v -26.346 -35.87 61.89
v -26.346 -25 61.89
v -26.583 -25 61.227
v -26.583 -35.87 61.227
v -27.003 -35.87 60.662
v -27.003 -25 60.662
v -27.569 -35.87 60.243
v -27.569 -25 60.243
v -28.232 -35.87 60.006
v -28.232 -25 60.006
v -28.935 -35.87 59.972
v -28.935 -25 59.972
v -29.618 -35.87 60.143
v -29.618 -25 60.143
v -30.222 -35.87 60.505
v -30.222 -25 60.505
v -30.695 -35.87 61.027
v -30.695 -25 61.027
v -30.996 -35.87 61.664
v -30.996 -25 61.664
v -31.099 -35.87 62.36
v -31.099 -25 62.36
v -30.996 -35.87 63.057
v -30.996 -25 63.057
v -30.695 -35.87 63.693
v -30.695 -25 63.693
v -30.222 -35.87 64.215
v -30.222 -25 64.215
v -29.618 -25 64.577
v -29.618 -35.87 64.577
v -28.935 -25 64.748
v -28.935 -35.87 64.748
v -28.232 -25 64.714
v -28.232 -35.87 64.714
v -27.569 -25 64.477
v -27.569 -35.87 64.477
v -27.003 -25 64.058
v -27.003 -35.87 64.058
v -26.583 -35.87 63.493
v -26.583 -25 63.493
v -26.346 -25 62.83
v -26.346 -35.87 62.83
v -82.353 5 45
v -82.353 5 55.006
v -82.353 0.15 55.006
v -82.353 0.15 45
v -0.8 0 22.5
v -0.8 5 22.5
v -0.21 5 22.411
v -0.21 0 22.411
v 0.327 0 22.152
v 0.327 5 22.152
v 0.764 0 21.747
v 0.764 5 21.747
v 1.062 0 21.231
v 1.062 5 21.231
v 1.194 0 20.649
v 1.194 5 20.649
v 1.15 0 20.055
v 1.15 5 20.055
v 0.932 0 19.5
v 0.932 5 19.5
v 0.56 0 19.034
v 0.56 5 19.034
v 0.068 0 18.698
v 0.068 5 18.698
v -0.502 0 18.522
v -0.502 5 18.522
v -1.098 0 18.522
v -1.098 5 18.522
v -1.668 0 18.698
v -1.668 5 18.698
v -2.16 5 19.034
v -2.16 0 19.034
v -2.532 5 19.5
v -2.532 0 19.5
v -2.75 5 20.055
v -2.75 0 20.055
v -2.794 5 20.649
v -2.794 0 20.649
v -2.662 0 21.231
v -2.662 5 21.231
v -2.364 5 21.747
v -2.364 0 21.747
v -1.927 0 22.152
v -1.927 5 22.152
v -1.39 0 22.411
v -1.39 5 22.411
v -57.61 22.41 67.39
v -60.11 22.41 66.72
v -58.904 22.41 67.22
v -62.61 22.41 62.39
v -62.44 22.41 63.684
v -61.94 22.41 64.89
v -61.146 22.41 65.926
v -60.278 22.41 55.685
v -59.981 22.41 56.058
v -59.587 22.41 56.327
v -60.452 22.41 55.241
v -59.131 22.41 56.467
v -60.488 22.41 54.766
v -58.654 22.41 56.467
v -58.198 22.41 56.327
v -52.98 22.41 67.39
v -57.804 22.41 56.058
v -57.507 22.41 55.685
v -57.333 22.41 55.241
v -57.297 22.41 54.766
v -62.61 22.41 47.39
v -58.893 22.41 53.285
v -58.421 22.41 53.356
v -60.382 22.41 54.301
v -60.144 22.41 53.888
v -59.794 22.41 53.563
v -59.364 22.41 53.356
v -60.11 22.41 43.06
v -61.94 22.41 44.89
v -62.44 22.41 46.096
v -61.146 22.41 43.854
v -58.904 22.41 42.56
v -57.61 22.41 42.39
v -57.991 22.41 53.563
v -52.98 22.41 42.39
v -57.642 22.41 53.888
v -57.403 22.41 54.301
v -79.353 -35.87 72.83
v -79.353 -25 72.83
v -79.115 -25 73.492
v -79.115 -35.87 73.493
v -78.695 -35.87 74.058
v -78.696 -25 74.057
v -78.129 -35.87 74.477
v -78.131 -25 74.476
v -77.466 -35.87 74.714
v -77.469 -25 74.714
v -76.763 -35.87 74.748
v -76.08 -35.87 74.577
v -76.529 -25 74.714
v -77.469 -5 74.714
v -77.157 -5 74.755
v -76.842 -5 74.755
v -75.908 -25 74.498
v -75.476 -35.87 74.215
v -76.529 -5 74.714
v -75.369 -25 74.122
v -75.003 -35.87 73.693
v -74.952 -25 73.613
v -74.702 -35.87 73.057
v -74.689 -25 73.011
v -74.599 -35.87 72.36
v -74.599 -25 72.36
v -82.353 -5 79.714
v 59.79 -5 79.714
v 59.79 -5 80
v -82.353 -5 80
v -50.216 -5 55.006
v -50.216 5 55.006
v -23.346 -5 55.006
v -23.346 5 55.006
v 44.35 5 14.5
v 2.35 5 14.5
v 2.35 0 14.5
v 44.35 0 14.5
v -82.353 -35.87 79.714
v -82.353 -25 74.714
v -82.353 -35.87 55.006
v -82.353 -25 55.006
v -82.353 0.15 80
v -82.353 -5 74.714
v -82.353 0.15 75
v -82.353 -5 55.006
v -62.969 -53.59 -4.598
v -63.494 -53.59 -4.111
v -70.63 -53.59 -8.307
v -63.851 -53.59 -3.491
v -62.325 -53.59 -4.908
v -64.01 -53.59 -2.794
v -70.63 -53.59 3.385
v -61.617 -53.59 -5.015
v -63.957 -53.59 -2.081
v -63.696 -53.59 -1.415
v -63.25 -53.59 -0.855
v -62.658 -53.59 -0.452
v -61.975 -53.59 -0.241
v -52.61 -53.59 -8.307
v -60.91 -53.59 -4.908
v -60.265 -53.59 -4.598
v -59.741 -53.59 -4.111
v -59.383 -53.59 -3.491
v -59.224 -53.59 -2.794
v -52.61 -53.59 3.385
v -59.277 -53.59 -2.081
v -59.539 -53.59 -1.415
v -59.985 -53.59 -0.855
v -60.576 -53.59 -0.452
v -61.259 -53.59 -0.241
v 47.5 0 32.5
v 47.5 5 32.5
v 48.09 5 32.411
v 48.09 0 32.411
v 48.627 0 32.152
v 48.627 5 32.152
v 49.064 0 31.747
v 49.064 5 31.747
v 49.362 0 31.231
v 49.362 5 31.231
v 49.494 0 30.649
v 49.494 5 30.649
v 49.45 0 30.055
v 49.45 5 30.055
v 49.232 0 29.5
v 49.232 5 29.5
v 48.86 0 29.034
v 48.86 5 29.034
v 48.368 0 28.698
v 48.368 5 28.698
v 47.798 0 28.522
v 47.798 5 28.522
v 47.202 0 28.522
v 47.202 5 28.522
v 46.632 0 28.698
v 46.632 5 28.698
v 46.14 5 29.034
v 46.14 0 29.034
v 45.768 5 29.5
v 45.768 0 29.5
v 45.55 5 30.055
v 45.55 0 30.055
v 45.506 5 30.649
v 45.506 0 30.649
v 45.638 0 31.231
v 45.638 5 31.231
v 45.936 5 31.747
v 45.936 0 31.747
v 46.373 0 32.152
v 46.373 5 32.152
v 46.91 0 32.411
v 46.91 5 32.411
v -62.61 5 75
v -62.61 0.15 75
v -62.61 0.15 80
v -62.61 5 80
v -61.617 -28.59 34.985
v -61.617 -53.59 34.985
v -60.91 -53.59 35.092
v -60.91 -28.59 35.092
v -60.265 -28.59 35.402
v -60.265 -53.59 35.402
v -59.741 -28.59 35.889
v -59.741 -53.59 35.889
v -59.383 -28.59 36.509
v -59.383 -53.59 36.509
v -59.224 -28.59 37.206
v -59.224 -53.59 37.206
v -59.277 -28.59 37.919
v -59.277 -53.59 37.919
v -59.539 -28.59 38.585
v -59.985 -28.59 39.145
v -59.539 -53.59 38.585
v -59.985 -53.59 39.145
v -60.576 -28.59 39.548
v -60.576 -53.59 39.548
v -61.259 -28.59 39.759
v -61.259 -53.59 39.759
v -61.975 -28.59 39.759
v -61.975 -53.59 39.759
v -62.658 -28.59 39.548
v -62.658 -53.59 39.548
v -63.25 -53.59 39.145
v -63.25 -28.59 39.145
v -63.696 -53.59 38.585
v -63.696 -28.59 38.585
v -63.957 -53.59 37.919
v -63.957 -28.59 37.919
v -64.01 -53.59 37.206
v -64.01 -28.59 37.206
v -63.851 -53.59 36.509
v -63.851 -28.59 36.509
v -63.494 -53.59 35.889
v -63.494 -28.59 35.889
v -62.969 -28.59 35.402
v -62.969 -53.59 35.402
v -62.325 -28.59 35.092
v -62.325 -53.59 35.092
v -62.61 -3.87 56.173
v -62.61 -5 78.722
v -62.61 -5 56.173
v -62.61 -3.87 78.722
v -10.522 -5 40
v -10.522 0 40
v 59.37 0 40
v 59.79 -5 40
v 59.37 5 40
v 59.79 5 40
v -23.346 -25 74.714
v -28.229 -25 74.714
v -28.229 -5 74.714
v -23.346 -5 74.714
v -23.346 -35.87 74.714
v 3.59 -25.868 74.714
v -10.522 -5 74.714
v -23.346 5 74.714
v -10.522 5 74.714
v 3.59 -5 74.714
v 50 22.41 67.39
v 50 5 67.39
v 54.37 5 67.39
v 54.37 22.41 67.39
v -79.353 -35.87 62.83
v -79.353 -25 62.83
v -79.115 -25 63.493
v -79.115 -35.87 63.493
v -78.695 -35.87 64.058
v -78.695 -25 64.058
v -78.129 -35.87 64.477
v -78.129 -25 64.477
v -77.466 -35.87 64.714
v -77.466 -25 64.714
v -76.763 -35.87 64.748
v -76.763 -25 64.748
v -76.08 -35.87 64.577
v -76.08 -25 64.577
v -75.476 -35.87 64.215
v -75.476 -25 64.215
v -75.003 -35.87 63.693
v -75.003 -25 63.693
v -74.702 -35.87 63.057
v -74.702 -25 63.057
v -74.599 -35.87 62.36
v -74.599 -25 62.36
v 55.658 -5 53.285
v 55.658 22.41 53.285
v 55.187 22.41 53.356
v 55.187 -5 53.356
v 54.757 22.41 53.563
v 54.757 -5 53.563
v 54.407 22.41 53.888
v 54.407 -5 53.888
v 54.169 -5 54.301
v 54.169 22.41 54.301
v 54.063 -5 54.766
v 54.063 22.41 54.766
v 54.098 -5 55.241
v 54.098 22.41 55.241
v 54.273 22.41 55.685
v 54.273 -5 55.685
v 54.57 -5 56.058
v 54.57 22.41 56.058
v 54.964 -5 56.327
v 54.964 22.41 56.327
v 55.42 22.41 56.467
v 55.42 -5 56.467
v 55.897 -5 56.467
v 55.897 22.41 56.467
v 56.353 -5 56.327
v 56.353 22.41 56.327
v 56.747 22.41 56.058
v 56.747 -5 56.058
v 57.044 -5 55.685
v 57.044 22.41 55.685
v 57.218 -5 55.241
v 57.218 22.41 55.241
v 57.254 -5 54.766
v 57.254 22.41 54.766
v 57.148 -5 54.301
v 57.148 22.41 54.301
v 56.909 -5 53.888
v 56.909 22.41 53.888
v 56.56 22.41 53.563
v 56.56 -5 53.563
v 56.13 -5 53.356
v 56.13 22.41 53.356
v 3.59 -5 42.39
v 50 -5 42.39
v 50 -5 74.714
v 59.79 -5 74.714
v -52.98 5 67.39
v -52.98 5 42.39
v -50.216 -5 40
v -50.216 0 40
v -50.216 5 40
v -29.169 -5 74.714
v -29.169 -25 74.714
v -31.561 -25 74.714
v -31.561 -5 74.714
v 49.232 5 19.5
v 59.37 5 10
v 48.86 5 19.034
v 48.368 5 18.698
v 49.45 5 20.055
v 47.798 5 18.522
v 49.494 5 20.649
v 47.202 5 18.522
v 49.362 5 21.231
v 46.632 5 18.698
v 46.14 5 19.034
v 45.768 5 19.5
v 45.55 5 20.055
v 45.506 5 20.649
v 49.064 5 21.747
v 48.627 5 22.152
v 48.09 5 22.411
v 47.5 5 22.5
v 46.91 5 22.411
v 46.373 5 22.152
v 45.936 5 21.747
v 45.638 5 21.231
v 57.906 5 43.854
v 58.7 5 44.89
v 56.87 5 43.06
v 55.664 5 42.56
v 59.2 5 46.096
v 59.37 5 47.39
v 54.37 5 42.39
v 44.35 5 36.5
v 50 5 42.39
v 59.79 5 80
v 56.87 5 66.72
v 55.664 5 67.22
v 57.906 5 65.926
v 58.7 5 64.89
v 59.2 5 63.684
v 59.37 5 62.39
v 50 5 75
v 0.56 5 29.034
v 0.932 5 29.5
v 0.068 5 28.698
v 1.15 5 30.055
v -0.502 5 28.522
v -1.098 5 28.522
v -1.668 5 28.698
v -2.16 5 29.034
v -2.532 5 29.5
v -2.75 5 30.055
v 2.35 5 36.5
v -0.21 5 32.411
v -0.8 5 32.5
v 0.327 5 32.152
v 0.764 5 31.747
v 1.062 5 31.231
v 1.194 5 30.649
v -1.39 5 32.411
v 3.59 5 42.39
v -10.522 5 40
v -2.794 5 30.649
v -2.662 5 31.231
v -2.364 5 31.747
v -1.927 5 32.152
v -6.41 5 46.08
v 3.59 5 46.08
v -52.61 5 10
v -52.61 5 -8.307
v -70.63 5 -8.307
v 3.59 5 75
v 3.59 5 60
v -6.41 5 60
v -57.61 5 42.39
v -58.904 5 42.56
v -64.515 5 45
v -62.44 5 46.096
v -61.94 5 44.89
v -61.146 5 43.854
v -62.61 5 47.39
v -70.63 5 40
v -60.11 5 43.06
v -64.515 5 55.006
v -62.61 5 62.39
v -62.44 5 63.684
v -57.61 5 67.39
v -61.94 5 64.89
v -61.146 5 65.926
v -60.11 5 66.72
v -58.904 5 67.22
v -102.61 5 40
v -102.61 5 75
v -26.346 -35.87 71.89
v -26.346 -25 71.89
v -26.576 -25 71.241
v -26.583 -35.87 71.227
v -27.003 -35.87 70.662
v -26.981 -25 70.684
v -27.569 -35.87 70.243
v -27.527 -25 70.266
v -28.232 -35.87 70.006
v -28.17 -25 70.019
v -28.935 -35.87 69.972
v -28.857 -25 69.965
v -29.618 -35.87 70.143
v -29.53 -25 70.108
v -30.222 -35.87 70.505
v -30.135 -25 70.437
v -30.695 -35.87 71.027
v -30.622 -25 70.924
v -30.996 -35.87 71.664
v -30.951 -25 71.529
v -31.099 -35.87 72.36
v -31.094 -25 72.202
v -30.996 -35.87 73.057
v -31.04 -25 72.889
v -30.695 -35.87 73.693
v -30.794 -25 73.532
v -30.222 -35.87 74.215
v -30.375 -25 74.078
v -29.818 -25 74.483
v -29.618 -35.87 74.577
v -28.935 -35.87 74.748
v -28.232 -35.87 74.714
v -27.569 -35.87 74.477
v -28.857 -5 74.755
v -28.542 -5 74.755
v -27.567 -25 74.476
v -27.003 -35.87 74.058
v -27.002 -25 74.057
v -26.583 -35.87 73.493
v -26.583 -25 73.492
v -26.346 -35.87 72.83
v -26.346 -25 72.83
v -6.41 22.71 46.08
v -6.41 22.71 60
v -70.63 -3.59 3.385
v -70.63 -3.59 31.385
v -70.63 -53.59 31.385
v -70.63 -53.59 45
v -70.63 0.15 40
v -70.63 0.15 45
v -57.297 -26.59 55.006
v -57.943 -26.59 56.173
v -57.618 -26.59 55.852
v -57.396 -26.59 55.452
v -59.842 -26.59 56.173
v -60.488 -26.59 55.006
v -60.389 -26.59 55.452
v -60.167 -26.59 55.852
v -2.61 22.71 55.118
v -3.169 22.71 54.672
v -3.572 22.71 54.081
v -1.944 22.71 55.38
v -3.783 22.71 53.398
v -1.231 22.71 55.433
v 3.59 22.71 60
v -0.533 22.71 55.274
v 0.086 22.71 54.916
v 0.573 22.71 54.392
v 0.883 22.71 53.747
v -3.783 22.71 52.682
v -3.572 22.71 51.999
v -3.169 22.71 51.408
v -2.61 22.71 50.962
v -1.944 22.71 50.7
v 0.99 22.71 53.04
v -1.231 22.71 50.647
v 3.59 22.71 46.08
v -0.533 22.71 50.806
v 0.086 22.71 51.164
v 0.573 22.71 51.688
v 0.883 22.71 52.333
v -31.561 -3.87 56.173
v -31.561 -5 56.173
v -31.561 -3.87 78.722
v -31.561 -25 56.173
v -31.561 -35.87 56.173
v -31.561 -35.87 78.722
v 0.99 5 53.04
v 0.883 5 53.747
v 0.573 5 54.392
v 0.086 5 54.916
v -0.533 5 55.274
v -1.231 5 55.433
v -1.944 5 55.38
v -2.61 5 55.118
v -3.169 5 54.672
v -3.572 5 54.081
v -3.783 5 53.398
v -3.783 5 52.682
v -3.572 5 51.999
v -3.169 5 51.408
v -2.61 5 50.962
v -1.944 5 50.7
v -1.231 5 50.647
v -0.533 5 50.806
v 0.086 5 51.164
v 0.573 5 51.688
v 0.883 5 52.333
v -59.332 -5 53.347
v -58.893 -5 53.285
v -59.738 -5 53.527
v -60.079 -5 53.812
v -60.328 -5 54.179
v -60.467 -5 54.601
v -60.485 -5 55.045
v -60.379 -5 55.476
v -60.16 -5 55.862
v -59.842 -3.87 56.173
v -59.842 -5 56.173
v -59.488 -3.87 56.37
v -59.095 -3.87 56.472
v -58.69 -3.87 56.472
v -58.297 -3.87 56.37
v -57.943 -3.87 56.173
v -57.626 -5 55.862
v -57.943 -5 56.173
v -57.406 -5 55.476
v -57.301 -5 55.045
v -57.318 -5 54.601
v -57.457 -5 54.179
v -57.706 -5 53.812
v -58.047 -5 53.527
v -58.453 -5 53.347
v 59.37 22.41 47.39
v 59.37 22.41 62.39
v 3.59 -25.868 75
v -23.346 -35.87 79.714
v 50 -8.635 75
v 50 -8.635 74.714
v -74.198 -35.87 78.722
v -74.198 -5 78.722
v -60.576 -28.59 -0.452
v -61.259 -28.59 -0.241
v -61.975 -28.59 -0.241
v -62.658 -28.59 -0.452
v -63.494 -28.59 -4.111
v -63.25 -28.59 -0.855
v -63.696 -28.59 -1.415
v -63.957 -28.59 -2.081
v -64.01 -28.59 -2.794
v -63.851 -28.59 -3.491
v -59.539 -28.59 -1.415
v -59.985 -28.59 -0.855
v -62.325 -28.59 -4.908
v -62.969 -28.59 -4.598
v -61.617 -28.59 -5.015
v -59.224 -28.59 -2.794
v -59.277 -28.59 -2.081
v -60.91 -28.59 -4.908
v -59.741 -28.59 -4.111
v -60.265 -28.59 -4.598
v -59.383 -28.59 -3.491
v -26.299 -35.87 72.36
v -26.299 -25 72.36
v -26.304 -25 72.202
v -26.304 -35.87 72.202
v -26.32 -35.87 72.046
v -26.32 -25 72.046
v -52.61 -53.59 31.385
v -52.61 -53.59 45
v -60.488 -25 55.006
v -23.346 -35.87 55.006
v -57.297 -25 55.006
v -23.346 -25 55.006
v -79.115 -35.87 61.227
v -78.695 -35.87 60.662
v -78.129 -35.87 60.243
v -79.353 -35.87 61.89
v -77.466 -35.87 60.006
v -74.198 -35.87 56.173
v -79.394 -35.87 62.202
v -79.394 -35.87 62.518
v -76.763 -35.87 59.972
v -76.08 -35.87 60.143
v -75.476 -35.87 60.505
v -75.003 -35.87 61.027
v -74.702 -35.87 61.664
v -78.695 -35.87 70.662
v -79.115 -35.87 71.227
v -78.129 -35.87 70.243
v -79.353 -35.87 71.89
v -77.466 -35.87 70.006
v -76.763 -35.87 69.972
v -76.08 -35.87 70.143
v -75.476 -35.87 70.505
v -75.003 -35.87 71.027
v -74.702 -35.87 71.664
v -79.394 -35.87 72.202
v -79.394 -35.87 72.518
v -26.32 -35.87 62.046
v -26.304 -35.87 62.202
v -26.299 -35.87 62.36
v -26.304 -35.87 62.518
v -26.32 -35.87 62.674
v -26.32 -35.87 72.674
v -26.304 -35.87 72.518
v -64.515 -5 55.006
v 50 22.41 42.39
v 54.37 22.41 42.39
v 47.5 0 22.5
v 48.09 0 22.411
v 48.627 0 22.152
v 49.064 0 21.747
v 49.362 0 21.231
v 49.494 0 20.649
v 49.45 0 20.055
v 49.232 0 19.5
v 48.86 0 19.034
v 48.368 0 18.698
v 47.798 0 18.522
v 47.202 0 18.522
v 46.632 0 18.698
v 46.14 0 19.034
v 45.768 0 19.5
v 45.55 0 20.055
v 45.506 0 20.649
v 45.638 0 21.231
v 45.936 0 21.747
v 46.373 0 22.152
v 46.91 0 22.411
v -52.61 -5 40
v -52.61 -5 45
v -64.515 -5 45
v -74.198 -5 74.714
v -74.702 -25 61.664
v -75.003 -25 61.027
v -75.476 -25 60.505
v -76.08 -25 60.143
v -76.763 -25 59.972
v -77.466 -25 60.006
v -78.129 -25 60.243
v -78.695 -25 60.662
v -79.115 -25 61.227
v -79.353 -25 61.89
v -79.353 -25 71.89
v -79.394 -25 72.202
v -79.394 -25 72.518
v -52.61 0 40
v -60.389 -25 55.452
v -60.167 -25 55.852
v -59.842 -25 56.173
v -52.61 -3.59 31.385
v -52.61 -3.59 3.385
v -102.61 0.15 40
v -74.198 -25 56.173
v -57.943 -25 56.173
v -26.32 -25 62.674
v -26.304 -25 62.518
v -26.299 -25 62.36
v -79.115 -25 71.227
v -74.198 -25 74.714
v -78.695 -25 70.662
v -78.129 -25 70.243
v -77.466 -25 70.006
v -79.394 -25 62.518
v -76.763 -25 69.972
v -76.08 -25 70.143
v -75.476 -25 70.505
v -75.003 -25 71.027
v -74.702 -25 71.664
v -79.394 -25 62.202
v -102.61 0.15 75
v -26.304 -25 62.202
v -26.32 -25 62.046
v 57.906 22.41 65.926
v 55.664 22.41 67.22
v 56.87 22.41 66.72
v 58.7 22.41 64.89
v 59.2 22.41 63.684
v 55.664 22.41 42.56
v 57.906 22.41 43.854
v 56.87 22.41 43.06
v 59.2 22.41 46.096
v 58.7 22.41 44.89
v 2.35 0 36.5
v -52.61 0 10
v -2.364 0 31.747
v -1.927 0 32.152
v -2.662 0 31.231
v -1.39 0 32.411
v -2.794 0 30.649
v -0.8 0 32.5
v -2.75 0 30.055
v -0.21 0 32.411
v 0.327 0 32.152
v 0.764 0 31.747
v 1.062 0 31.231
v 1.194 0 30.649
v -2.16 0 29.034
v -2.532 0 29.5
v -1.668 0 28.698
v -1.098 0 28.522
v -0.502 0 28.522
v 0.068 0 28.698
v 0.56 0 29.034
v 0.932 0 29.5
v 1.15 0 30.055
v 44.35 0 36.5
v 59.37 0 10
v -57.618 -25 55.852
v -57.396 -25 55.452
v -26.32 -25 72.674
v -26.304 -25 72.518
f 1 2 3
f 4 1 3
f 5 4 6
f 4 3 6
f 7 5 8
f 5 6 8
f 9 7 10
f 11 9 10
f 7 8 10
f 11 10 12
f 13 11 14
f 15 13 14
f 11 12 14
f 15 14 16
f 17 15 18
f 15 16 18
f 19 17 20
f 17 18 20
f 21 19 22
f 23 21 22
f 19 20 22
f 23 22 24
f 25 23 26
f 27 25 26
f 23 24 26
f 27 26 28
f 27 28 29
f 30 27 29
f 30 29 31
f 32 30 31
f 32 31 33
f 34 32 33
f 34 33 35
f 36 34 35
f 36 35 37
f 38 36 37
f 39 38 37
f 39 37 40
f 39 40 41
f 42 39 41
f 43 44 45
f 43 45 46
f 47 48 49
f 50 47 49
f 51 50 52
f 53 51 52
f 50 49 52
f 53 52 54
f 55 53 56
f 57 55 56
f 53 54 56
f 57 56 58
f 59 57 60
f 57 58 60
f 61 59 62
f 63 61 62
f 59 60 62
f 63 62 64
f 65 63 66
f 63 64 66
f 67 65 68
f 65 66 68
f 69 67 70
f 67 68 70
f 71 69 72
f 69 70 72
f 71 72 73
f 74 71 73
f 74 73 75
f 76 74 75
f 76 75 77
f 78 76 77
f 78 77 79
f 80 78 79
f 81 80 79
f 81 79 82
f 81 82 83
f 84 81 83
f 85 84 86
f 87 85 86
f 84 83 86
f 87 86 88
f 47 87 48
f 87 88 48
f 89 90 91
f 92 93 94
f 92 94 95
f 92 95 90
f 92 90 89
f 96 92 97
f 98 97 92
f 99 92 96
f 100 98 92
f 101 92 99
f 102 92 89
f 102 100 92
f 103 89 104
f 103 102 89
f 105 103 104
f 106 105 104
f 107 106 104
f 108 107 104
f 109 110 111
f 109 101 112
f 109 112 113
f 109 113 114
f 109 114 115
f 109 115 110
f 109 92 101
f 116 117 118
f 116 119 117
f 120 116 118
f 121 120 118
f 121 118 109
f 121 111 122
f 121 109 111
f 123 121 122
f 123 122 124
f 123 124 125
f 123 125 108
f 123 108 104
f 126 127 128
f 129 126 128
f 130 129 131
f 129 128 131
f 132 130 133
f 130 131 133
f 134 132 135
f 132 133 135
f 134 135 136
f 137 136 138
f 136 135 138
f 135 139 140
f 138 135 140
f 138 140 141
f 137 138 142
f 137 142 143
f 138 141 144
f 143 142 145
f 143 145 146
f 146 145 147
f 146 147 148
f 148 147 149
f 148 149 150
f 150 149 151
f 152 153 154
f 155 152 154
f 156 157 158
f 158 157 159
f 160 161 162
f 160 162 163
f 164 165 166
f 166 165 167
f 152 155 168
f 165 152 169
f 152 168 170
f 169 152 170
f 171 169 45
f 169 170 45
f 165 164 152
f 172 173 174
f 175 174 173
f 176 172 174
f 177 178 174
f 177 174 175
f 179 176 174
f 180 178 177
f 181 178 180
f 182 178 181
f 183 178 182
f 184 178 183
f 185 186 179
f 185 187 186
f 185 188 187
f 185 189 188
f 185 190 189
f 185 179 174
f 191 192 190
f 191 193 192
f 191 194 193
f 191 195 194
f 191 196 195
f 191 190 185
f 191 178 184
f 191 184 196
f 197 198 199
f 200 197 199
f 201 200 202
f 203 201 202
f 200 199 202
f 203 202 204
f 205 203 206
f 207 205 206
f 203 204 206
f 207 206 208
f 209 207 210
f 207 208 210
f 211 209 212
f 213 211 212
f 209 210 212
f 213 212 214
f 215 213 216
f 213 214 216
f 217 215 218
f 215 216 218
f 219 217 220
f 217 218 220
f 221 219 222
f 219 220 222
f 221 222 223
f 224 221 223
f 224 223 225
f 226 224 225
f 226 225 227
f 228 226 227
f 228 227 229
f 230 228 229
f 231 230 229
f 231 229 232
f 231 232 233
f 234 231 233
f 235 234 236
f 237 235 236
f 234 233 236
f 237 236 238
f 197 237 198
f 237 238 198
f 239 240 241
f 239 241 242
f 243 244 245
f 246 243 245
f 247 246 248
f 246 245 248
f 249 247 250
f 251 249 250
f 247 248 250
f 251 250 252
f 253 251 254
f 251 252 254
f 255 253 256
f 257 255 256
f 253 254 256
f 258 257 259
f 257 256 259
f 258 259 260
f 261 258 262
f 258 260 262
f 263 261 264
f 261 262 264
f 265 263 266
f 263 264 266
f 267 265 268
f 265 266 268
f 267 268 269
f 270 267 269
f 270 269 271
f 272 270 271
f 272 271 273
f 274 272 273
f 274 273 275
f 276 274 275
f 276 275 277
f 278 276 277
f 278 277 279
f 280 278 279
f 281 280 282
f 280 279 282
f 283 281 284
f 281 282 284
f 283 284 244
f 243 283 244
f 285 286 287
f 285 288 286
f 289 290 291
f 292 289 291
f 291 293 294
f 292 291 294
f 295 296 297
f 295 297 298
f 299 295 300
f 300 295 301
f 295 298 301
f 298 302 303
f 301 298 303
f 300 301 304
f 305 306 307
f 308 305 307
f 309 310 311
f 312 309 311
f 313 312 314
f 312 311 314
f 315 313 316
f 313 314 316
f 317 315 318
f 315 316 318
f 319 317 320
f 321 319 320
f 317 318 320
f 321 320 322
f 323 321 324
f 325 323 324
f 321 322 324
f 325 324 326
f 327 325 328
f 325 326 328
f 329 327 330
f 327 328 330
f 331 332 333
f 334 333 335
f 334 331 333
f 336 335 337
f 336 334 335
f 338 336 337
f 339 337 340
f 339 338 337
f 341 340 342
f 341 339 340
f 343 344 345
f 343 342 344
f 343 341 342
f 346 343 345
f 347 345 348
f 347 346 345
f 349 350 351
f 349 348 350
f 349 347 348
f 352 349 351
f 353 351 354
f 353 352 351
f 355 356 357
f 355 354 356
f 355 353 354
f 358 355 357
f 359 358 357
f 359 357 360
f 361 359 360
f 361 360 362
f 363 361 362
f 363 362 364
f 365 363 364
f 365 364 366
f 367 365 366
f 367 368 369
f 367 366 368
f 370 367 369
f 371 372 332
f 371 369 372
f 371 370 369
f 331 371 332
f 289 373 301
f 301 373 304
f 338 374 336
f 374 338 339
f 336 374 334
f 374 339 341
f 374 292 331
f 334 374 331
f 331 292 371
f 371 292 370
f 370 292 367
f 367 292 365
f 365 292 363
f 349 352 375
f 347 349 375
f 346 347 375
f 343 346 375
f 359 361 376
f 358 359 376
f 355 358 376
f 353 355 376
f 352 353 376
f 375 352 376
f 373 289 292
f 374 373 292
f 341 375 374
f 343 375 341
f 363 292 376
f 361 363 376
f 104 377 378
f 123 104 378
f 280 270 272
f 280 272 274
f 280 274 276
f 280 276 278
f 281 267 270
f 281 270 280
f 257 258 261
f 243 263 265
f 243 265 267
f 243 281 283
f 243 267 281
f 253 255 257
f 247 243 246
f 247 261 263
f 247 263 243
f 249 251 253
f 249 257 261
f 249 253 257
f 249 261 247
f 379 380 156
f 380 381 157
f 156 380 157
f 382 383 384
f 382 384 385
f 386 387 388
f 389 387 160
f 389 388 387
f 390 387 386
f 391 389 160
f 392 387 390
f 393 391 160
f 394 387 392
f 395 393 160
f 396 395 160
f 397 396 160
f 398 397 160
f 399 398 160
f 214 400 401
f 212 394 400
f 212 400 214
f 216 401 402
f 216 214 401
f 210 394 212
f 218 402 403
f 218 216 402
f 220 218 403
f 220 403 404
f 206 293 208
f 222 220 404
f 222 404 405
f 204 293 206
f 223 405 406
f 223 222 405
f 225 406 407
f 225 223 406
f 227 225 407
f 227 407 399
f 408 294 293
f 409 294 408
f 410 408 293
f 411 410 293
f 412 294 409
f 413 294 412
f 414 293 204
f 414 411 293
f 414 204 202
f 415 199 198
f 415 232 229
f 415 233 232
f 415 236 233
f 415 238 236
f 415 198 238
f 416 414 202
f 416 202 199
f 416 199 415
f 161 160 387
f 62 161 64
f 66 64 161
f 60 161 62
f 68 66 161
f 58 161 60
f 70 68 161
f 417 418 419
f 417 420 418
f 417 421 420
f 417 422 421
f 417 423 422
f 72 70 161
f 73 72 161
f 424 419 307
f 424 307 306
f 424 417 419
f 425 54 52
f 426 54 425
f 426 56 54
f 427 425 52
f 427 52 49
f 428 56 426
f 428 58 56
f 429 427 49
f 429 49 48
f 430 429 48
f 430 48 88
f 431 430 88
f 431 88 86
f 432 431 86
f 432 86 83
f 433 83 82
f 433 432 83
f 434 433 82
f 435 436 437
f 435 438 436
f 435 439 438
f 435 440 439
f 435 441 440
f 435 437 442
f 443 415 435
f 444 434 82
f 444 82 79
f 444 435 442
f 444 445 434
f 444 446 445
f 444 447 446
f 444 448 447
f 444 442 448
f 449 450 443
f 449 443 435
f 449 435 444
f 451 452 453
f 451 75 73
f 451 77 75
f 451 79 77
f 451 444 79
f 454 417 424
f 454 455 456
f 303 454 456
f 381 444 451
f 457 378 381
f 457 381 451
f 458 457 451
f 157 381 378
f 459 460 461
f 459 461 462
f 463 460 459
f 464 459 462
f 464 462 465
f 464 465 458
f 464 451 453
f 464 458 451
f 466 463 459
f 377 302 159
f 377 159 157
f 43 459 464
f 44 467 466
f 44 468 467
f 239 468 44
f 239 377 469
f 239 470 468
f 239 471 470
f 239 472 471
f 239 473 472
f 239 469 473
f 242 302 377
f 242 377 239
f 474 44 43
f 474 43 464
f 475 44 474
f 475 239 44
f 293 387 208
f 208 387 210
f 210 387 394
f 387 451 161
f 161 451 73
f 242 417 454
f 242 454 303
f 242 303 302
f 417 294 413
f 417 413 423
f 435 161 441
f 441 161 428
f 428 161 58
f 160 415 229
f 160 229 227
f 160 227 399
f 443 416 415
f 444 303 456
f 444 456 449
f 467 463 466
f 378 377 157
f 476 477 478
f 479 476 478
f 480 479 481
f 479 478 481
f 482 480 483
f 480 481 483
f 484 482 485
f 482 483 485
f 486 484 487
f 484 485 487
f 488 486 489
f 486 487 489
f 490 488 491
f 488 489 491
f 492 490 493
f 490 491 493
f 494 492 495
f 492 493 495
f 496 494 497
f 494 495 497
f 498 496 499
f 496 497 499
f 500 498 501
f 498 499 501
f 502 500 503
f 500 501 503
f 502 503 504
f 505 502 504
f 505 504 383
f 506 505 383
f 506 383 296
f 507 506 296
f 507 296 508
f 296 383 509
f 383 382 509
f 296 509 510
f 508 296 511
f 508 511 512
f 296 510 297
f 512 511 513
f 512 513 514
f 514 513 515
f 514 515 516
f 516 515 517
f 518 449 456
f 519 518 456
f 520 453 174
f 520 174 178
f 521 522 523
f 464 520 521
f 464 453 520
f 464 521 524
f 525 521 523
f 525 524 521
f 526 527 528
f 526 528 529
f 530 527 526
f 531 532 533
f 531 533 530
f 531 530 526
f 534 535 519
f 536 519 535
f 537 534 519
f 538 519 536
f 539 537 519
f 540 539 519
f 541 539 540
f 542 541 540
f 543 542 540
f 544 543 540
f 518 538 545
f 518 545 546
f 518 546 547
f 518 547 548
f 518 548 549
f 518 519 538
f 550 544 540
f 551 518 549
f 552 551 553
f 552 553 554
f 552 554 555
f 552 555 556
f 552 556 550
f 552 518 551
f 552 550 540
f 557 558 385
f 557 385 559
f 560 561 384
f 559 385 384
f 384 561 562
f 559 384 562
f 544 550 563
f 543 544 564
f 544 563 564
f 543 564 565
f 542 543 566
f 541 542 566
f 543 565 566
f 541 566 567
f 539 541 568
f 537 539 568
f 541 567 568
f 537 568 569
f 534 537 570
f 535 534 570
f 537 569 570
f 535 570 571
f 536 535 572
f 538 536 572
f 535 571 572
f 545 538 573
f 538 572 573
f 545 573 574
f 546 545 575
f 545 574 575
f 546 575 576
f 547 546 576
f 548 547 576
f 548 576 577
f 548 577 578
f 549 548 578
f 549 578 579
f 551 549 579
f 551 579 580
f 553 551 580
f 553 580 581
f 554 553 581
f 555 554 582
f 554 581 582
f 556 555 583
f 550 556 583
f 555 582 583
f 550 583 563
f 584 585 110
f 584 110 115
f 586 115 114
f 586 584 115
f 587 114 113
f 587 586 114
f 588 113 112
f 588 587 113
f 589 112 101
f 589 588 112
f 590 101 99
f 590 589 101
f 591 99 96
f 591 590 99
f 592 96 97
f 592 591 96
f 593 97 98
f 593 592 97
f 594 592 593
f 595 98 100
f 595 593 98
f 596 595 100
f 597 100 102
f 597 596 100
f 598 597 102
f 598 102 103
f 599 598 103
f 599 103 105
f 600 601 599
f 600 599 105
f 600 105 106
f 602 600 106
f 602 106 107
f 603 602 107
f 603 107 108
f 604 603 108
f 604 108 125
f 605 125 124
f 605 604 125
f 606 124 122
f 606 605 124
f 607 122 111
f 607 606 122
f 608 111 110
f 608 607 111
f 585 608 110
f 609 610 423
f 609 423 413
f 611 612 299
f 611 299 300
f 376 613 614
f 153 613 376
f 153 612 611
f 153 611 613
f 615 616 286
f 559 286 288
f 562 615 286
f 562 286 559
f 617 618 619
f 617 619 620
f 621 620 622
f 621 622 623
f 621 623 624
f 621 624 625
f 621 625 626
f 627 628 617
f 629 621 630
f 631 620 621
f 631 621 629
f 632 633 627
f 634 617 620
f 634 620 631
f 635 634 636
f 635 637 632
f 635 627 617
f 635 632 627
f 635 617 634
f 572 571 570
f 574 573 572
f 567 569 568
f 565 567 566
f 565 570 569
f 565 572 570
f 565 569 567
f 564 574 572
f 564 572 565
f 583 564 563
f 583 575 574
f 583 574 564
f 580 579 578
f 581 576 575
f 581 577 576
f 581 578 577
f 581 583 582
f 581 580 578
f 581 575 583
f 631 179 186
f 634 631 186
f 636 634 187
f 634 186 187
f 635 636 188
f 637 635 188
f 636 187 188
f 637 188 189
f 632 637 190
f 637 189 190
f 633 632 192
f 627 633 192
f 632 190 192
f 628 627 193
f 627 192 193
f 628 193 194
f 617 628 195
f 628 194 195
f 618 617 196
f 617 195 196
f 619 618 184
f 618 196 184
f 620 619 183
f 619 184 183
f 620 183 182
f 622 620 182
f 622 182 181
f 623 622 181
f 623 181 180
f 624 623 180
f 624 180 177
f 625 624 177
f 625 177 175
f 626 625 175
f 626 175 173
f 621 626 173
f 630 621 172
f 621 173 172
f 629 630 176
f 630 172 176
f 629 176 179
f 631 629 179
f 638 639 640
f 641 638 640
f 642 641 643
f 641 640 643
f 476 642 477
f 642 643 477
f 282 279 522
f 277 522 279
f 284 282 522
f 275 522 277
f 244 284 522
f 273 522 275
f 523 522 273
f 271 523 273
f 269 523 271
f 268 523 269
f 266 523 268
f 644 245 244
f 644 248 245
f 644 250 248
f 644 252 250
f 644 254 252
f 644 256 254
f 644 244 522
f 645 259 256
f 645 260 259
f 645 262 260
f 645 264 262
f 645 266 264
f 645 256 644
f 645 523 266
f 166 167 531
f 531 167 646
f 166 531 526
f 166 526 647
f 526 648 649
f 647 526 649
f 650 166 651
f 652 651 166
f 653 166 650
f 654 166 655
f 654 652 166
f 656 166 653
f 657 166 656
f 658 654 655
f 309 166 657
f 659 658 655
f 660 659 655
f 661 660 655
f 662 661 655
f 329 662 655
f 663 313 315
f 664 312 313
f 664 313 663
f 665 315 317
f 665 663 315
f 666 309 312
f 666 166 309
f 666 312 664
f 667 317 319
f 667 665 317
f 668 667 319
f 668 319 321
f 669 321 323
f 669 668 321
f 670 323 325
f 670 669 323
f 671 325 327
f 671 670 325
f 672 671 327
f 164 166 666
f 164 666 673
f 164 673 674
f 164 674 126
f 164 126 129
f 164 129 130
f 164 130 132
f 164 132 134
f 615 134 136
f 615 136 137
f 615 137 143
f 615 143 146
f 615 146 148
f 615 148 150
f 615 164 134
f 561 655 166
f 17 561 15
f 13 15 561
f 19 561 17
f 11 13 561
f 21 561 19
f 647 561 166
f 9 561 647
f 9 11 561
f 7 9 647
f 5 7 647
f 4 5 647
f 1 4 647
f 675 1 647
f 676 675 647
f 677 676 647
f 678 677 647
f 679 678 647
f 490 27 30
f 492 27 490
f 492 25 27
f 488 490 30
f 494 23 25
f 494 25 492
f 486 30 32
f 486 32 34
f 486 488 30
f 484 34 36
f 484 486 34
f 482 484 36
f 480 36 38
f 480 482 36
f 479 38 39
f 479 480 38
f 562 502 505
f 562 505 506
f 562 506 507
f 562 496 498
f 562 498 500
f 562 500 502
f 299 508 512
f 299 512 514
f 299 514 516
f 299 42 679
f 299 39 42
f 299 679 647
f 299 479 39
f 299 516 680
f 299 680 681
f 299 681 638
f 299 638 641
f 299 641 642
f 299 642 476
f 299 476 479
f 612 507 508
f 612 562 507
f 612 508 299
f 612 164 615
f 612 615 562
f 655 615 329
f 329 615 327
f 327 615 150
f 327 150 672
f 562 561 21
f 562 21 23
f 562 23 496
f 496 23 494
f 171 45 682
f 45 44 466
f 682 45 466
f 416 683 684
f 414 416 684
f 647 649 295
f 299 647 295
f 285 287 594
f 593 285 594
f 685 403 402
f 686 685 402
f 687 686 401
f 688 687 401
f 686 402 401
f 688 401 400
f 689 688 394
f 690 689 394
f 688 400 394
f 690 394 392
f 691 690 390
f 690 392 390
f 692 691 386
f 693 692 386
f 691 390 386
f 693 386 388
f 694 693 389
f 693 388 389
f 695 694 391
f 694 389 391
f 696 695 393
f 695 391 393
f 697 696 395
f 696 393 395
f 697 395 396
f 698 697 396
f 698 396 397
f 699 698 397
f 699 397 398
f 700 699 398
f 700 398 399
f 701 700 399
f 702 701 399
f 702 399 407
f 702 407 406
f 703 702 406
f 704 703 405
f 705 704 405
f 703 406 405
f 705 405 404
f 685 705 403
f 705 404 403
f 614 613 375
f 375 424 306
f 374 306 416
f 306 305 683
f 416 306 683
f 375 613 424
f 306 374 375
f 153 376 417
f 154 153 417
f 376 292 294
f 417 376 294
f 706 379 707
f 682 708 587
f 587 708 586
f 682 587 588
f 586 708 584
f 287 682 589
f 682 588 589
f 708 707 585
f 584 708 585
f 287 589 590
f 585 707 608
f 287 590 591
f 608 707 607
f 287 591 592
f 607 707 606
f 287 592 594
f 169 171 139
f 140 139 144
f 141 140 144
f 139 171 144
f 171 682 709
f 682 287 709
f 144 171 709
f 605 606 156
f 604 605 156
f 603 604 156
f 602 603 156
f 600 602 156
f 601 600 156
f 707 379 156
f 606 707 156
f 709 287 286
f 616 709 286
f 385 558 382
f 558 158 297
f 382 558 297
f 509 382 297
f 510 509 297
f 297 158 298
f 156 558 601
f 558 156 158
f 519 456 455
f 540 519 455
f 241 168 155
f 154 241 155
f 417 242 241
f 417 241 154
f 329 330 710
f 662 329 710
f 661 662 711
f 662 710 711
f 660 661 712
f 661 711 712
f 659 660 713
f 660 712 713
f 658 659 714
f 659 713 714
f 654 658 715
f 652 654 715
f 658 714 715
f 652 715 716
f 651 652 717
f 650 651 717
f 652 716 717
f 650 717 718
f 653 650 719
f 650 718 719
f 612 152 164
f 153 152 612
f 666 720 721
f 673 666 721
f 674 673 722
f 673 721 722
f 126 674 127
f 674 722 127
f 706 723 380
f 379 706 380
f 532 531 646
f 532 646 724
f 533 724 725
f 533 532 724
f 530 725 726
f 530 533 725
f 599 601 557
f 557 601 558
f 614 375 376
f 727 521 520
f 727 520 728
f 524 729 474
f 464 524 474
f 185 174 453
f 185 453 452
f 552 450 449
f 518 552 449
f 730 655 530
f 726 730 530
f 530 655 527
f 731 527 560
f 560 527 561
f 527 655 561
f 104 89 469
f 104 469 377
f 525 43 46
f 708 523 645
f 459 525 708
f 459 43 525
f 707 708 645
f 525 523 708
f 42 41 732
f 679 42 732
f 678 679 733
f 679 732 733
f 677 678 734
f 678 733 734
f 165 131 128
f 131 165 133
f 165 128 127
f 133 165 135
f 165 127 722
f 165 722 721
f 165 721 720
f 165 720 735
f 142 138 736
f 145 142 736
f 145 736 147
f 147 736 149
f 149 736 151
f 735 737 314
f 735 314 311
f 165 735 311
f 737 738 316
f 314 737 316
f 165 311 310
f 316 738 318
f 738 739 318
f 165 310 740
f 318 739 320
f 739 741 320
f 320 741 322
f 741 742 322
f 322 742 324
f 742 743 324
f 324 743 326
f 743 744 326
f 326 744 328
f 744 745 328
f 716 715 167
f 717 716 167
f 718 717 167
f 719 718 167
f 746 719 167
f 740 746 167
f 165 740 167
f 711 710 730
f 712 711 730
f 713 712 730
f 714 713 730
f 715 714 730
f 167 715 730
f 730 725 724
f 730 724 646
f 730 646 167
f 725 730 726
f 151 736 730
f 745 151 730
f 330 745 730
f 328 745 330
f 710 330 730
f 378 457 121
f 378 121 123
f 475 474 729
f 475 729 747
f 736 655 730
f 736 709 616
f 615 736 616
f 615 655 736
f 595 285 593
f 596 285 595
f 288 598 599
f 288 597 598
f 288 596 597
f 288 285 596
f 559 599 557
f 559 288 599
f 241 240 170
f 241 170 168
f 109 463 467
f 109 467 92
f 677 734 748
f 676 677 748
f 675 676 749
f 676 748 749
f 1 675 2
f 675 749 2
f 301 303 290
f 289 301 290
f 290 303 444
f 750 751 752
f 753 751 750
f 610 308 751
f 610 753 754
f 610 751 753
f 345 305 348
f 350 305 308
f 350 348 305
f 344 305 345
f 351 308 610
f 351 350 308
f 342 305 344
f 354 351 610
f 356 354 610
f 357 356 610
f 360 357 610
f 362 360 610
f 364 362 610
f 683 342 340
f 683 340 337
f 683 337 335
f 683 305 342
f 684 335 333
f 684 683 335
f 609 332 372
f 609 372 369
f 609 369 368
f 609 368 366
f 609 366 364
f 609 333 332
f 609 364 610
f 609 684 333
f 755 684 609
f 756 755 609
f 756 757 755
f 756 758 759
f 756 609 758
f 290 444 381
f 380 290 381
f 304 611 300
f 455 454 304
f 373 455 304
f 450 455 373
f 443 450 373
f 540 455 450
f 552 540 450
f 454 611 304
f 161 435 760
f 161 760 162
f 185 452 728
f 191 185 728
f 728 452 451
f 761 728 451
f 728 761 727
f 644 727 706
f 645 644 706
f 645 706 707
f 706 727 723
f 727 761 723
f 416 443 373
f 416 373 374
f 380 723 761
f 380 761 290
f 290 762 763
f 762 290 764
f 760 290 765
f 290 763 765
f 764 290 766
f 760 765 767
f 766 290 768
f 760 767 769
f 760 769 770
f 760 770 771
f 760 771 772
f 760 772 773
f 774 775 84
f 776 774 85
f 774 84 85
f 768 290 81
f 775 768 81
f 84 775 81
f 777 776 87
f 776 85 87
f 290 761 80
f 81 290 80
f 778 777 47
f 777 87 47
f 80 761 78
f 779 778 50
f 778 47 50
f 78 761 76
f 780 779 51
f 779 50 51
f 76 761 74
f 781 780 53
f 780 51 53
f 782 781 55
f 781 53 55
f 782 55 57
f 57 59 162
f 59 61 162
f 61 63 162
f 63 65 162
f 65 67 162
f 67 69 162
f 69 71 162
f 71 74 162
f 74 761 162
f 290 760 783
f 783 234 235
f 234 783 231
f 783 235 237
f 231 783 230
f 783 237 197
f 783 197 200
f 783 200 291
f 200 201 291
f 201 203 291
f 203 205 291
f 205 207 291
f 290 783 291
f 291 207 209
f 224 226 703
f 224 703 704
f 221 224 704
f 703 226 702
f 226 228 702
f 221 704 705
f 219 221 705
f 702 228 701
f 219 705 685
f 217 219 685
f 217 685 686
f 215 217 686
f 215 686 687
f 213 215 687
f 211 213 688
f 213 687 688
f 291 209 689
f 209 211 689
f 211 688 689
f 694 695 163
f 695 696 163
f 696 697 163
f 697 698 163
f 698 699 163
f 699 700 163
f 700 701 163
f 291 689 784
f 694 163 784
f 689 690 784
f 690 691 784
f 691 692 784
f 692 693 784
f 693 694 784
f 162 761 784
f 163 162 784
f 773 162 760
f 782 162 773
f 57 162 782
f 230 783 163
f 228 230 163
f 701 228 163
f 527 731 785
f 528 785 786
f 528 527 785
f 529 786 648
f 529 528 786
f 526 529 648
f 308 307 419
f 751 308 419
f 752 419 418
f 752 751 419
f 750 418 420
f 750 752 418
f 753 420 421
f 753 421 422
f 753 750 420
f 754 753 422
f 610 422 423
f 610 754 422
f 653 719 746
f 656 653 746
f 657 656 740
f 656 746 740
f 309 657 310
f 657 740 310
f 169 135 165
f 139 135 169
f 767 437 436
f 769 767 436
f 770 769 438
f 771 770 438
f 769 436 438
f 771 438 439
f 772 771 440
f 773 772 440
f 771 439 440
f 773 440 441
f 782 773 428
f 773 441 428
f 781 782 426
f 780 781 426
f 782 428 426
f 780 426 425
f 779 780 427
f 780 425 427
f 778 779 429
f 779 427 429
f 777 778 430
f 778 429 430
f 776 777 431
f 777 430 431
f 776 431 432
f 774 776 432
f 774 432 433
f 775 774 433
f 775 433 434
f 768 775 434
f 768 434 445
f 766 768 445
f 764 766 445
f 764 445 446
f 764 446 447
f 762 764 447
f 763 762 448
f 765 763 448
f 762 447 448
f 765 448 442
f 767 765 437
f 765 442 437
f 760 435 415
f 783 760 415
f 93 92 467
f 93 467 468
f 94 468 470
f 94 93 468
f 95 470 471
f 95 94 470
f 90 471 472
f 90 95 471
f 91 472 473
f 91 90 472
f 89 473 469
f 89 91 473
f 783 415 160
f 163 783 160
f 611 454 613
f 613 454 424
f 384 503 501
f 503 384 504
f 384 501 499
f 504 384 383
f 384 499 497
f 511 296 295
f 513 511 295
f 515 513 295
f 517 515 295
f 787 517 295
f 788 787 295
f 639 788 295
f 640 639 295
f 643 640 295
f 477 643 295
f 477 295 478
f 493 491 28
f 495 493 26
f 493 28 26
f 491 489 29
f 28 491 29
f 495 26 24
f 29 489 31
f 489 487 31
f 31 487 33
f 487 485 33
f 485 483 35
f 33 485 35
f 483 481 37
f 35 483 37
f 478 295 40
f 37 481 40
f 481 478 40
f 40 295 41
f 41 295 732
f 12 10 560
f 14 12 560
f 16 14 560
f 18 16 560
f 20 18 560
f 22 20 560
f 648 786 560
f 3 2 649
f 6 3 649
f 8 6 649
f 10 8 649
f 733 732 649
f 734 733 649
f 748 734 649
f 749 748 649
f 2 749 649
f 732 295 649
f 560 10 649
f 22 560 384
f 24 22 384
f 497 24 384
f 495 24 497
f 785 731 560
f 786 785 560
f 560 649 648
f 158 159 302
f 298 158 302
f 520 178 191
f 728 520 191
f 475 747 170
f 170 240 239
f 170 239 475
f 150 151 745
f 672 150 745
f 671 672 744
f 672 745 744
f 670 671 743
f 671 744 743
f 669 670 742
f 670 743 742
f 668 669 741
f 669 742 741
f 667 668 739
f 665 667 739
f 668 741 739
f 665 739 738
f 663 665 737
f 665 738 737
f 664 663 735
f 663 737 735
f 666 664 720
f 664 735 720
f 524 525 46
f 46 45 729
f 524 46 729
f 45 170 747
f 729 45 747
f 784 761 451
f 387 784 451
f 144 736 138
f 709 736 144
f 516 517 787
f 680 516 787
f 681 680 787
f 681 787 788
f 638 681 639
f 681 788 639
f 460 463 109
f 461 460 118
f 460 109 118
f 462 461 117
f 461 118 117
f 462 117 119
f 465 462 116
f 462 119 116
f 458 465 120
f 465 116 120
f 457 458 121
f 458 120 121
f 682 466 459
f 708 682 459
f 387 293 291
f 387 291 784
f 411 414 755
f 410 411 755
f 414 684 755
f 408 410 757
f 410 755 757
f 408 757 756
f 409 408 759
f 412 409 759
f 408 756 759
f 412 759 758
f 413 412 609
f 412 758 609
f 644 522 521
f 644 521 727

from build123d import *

# Parameters (mm, degrees)
SKETCH1_W            = 120
SKETCH1_H            = 80
BOSS_EXTRUDE1_DEPTH  = 5
SKETCH2_R            = 2.000000001
CUT_EXTRUDE2_DEPTH   = 5
SKETCH3_W            = 90
SKETCH3_H            = 50
CUT_EXTRUDE3_DEPTH   = 5
SKETCH4_W            = 10
SKETCH4_H            = 5
BOSS_EXTRUDE2_DEPTH  = 27.39
SKETCH5_W            = 10
SKETCH5_H            = 5
BOSS_EXTRUDE3_DEPTH  = 20
BOSS_EXTRUDE4_DEPTH  = 17.71
SKETCH7_W            = 10
SKETCH7_H            = 27.39
BOSS_EXTRUDE5_DEPTH  = 17.41
SKETCH8_W            = 10
SKETCH8_H            = 2.39
CUT_EXTRUDE4_DEPTH   = 17.41
SKETCH9_W            = 57.39
SKETCH9_H            = 22.41
CUT_EXTRUDE5_DEPTH   = 0.63
FILLET1_R            = 5
SKETCH10_R           = 1.600000001
CUT_EXTRUDE6_DEPTH   = 94.043840204
SKETCH11_W           = 30
SKETCH11_H           = 5
BOSS_EXTRUDE6_DEPTH  = 2.61
SKETCH12_W           = 9.63
SKETCH12_H           = 5
BOSS_EXTRUDE7_DEPTH  = 27.39
SKETCH13_W           = 9.63
SKETCH13_H           = 25
BOSS_EXTRUDE8_DEPTH  = 17.41
FILLET2_R            = 5
SKETCH14_R           = 1.6
CUT_EXTRUDE7_DEPTH   = 95.747919766
SKETCH15_W           = 122.4
SKETCH15_H           = 10
BOSS_EXTRUDE9_DEPTH  = 40
SKETCH16_W           = 30
SKETCH16_H           = 50
CUT_EXTRUDE8_DEPTH   = 104.119620829
SKETCH17_W           = 35.000212548
SKETCH17_H           = 4.85
BOSS_EXTRUDE10_DEPTH = 40
SKETCH18_W           = 20
SKETCH18_H           = 4.85
BOSS_EXTRUDE11_DEPTH = 60
SKETCH19_W           = 10
SKETCH19_H           = 4.85
BOSS_EXTRUDE12_DEPTH = 30
SKETCH20_W           = 18.02
SKETCH20_H           = 65
BOSS_EXTRUDE13_DEPTH = 53.74
SKETCH21_R           = 2.4
CUT_EXTRUDE9_DEPTH   = 25
BOSS_EXTRUDE14_DEPTH = 30.87
SKETCH28_W           = 42.63693761
SKETCH28_H           = 22.549263077
CUT_EXTRUDE11_DEPTH  = 32
SKETCH29_W           = 11.98
SKETCH29_H           = 4.85
CUT_EXTRUDE12_DEPTH  = 60
BOSS_EXTRUDE15_DEPTH = 19.742742811
BOSS_EXTRUDE16_DEPTH = 5
SKETCH32_W           = 42
SKETCH32_H           = 22
CUT_EXTRUDE13_DEPTH  = 25
SKETCH33_W           = 18.02
SKETCH33_H           = 28
CUT_EXTRUDE14_DEPTH  = 50
SKETCH34_W           = 18.02
SKETCH34_H           = 11.692668542
CUT_EXTRUDE15_DEPTH  = 60
SKETCH35_W           = 19.707106781
SKETCH35_H           = 20
CUT_EXTRUDE16_DEPTH  = 60
SKETCH36_W           = 46.41
SKETCH36_H           = 32.61
CUT_EXTRUDE18_DEPTH  = 60
SKETCH38_W           = 17.837944425
SKETCH38_H           = 10.006474067
CUT_EXTRUDE20_DEPTH  = 49
CUT_EXTRUDE21_START  = -49
SKETCH39_R           = 1.6
SKETCH39_R_2         = 1.600000001
CUT_EXTRUDE21_DEPTH  = 49


with BuildPart() as part:
    # Sketch1 → Boss-Extrude1 (new body)
    with BuildSketch(Plane(origin=(0, 0, 0), x_dir=(1, 0, 0), z_dir=(0, 1, 0))):
        Rectangle(SKETCH1_W, SKETCH1_H)
    extrude(amount=BOSS_EXTRUDE1_DEPTH)

    # Sketch2 → Cut-Extrude2 (cut)
    with BuildSketch(Plane(origin=(0, 5, 0), x_dir=(1, 0, 0), z_dir=(0, 1, 0))):
        with Locations(Location((47.5, -20.500000004, 0), (0, 0, 270))):
            Circle(SKETCH2_R)
        with Locations(Location((47.5, -30.500000004, 0), (0, 0, 270))):
            Circle(SKETCH2_R)
        with Locations(Location((-0.8, -30.500000004, 0), (0, 0, 270))):
            Circle(SKETCH2_R)
        with Locations(Location((-0.8, -20.500000004, 0), (0, 0, 270))):
            Circle(SKETCH2_R)
    extrude(amount=-CUT_EXTRUDE2_DEPTH, mode=Mode.SUBTRACT)

    # Sketch3 → Cut-Extrude3 (cut)
    with BuildSketch(Plane(origin=(0, 5, 0), x_dir=(1, 0, 0), z_dir=(0, 1, 0))):
        with Locations((15, 15)):
            Rectangle(SKETCH3_W, SKETCH3_H)
    extrude(amount=-CUT_EXTRUDE3_DEPTH, mode=Mode.SUBTRACT)

    # Sketch4 → Boss-Extrude2 (add)
    with BuildSketch(Plane.XY.offset(40)):
        with Locations((55, 2.5)):
            Rectangle(SKETCH4_W, SKETCH4_H)
    extrude(amount=BOSS_EXTRUDE2_DEPTH)

    # Sketch5 → Boss-Extrude3 (add)
    with BuildSketch(Plane.XY.offset(40)):
        with Locations((-1.41, 2.5)):
            Rectangle(SKETCH5_W, SKETCH5_H)
    extrude(amount=BOSS_EXTRUDE3_DEPTH)

    # Sketch6 → Boss-Extrude4 (add)
    with BuildSketch(Plane(origin=(0, 5, 0), x_dir=(1, 0, 0), z_dir=(0, 1, 0))):
        with BuildLine():
            ThreePointArc((-3.81, -53.04), (-1.41, -50.64), (0.99, -53.04))
            Line((0.99, -53.04), (3.59, -53.04))
            Line((3.59, -53.04), (3.59, -46.08))
            Line((3.59, -46.08), (-6.41, -46.08))
            Line((-6.41, -46.08), (-6.41, -53.04))
            Line((-6.41, -53.04), (-3.81, -53.04))
        make_face()
        with BuildLine():
            Line((3.59, -53.04), (0.99, -53.04))
            ThreePointArc((0.99, -53.04), (-1.41, -55.44), (-3.81, -53.04))
            Line((-3.81, -53.04), (-6.41, -53.04))
            Line((-6.41, -53.04), (-6.41, -60))
            Line((-6.41, -60), (3.59, -60))
            Line((3.59, -60), (3.59, -53.04))
        make_face()
    extrude(amount=BOSS_EXTRUDE4_DEPTH)

    # Sketch7 → Boss-Extrude5 (add)
    with BuildSketch(Plane(origin=(0, 5, 0), x_dir=(1, 0, 0), z_dir=(0, 1, 0))):
        with Locations((55, -53.695)):
            Rectangle(SKETCH7_W, SKETCH7_H)
    extrude(amount=BOSS_EXTRUDE5_DEPTH)

    # Sketch8 → Cut-Extrude4 (cut)
    with BuildSketch(Plane(origin=(0, 22.41, 0), x_dir=(1, 0, 0), z_dir=(0, 1, 0))):
        with Locations((55, -41.195)):
            Rectangle(SKETCH8_W, SKETCH8_H)
    extrude(amount=-CUT_EXTRUDE4_DEPTH, mode=Mode.SUBTRACT)

    # Sketch9 → Cut-Extrude5 (cut)
    with BuildSketch(Plane(origin=(60, 0, 0), x_dir=(0, 0, -1), z_dir=(1, 0, 0))):
        with Locations((-38.695, 11.205)):
            Rectangle(SKETCH9_W, SKETCH9_H)
    extrude(amount=-CUT_EXTRUDE5_DEPTH, mode=Mode.SUBTRACT)

    # Fillet1
    fillet1_edges = [part.edges().sort_by_distance(p)[0] for p in [
        (59.37, 13.705, 42.39),
        (59.37, 11.205, 67.39),
    ]]
    fillet(fillet1_edges, radius=FILLET1_R)

    # Sketch10 → Cut-Extrude6 (cut, through all)
    with BuildSketch(Plane.XZ):
        with Locations(Location((55.658310639, 54.885337085, 0), (0, 0, 270))):
            Circle(SKETCH10_R)
    extrude(amount=-CUT_EXTRUDE6_DEPTH, mode=Mode.SUBTRACT)

    # Sketch11 → Boss-Extrude6 (add)
    with BuildSketch(Plane.ZY.offset(60)):
        with Locations((25, 2.5)):
            Rectangle(SKETCH11_W, SKETCH11_H)
    extrude(amount=BOSS_EXTRUDE6_DEPTH)

    # Sketch12 → Boss-Extrude7 (add)
    with BuildSketch(Plane.XY.offset(40)):
        with Locations((-57.795, 2.5)):
            Rectangle(SKETCH12_W, SKETCH12_H)
    extrude(amount=BOSS_EXTRUDE7_DEPTH)

    # Sketch13 → Boss-Extrude8 (add)
    with BuildSketch(Plane(origin=(0, 5, 0), x_dir=(1, 0, 0), z_dir=(0, 1, 0))):
        with Locations((-57.795, -54.89)):
            Rectangle(SKETCH13_W, SKETCH13_H)
    extrude(amount=BOSS_EXTRUDE8_DEPTH)

    # Fillet2
    fillet2_edges = [part.edges().sort_by_distance(p)[0] for p in [
        (-62.61, 11.205, 67.39),
        (-62.61, 13.705, 42.39),
    ]]
    fillet(fillet2_edges, radius=FILLET2_R)

    # Sketch14 → Cut-Extrude7 (cut, through all)
    with BuildSketch(Plane(origin=(0, 0, 0), x_dir=(-1, 0, 0), z_dir=(0, -1, 0))):
        with Locations(Location((58.892597711, -54.885337085, 0), (0, 0, 90))):
            Circle(SKETCH14_R)
    extrude(amount=-CUT_EXTRUDE7_DEPTH, mode=Mode.SUBTRACT)

    # Sketch15 → Boss-Extrude9 (add)
    with BuildSketch(Plane.XY.offset(40)):
        with Locations((-1.41, 0)):
            Rectangle(SKETCH15_W, SKETCH15_H)
    extrude(amount=BOSS_EXTRUDE9_DEPTH)

    # Sketch16 → Cut-Extrude8 (cut, through all)
    with BuildSketch(Plane(origin=(0, 5, 0), x_dir=(1, 0, 0), z_dir=(0, 1, 0))):
        with Locations((-45, 15)):
            Rectangle(SKETCH16_W, SKETCH16_H)
    extrude(amount=-CUT_EXTRUDE8_DEPTH, mode=Mode.SUBTRACT)

    # Sketch17 → Boss-Extrude10 (add)
    with BuildSketch(Plane.ZY.offset(62.61)):
        with Locations((57.500106274, 2.575)):
            Rectangle(SKETCH17_W, SKETCH17_H)
    extrude(amount=BOSS_EXTRUDE10_DEPTH)

    # Sketch18 → Boss-Extrude11 (add)
    with BuildSketch(Plane(origin=(0, 0, 40), x_dir=(-1, 0, 0), z_dir=(0, 0, -1))):
        with Locations((72.61, 2.575)):
            Rectangle(SKETCH18_W, SKETCH18_H)
    extrude(amount=BOSS_EXTRUDE11_DEPTH)

    # Sketch19 → Boss-Extrude12 (add)
    with BuildSketch(Plane(origin=(0, 0, 10), x_dir=(-1, 0, 0), z_dir=(0, 0, -1))):
        with Locations((57.61, 2.575)):
            Rectangle(SKETCH19_W, SKETCH19_H)
    extrude(amount=BOSS_EXTRUDE12_DEPTH)

    # Sketch20 → Boss-Extrude13 (add)
    with BuildSketch(Plane.XZ.offset(-0.15)):
        with Locations((-61.62, 12.5)):
            Rectangle(SKETCH20_W, SKETCH20_H)
    extrude(amount=BOSS_EXTRUDE13_DEPTH)

    # Sketch21 → Cut-Extrude9 (cut)
    with BuildSketch(Plane.XZ.offset(53.59)):
        with Locations(Location((-61.617143537, 37.385337084, 0), (0, 0, 270))):
            Circle(SKETCH21_R)
        with Locations(Location((-61.617143537, -2.614662916, 0), (0, 0, 270))):
            Circle(SKETCH21_R)
    extrude(amount=-CUT_EXTRUDE9_DEPTH, mode=Mode.SUBTRACT)

    # Sketch25 → Boss-Extrude14 (add)
    with BuildSketch(Plane.XZ.offset(5)):
        with BuildLine():
            Line((-62.61, 76.713580848), (-62.61, 79.713580848))
            Line((-62.61, 79.713580848), (-82.352742811, 79.713580848))
            Line((-82.352742811, 79.713580848), (-82.352742811, 55.006474067))
            Line((-82.352742811, 55.006474067), (-62.61, 55.006474067))
            Line((-62.61, 55.006474067), (-62.61, 58.006474067))
            Line((-62.61, 58.006474067), (-79.352742811, 58.006474067))
            Line((-79.352742811, 58.006474067), (-79.352742811, 61.890148284))
            ThreePointArc((-79.352742811, 61.890148284), (-79.39918942, 62.360027458), (-79.352742811, 62.829906631))
            Line((-79.352742811, 62.829906631), (-79.352742811, 71.890148284))
            ThreePointArc((-79.352742811, 71.890148284), (-79.39918942, 72.360027458), (-79.352742811, 72.829906631))
            Line((-79.352742811, 72.829906631), (-79.352742811, 76.713580848))
            Line((-79.352742811, 76.713580848), (-62.61, 76.713580848))
        make_face()
        with BuildLine():
            Line((-23.34563603, 55.006474067), (-23.34563603, 79.713580848))
            Line((-23.34563603, 79.713580848), (-62.61, 79.713580848))
            Line((-62.61, 79.713580848), (-62.61, 76.713580848))
            Line((-62.61, 76.713580848), (-26.34563603, 76.713580848))
            Line((-26.34563603, 76.713580848), (-26.34563603, 72.829906631))
            ThreePointArc((-26.34563603, 72.829906631), (-26.310829299, 72.596112043), (-26.29918942, 72.360027458))
            ThreePointArc((-26.29918942, 72.360027458), (-26.310829299, 72.123942872), (-26.34563603, 71.890148284))
            Line((-26.34563603, 71.890148284), (-26.34563603, 62.829906631))
            ThreePointArc((-26.34563603, 62.829906631), (-26.310829299, 62.596112043), (-26.29918942, 62.360027458))
            ThreePointArc((-26.29918942, 62.360027458), (-26.310829299, 62.123942872), (-26.34563603, 61.890148284))
            Line((-26.34563603, 61.890148284), (-26.34563603, 58.006474067))
            Line((-26.34563603, 58.006474067), (-62.61, 58.006474067))
            Line((-62.61, 58.006474067), (-62.61, 55.006474067))
            Line((-62.61, 55.006474067), (-23.34563603, 55.006474067))
        make_face()
        with BuildLine():
            Line((-26.34563603, 76.713580848), (-62.61, 76.713580848))
            Line((-62.61, 76.713580848), (-62.61, 58.006474067))
            Line((-62.61, 58.006474067), (-26.34563603, 58.006474067))
            Line((-26.34563603, 58.006474067), (-26.34563603, 61.890148284))
            ThreePointArc((-26.34563603, 61.890148284), (-31.09918942, 62.360027458), (-26.34563603, 62.829906631))
            Line((-26.34563603, 62.829906631), (-26.34563603, 71.890148284))
            ThreePointArc((-26.34563603, 71.890148284), (-31.09918942, 72.360027458), (-26.34563603, 72.829906631))
            Line((-26.34563603, 72.829906631), (-26.34563603, 76.713580848))
        make_face()
        with BuildLine():
            Line((-62.61, 58.006474067), (-62.61, 76.713580848))
            Line((-62.61, 76.713580848), (-79.352742811, 76.713580848))
            Line((-79.352742811, 76.713580848), (-79.352742811, 72.829906631))
            ThreePointArc((-79.352742811, 72.829906631), (-76.763104835, 74.748387579), (-74.59918942, 72.360027458))
            ThreePointArc((-74.59918942, 72.360027458), (-76.763104835, 69.971667336), (-79.352742811, 71.890148284))
            Line((-79.352742811, 71.890148284), (-79.352742811, 62.829906631))
            ThreePointArc((-79.352742811, 62.829906631), (-76.763104835, 64.748387579), (-74.59918942, 62.360027458))
            ThreePointArc((-74.59918942, 62.360027458), (-76.763104835, 59.971667336), (-79.352742811, 61.890148284))
            Line((-79.352742811, 61.890148284), (-79.352742811, 58.006474067))
            Line((-79.352742811, 58.006474067), (-62.61, 58.006474067))
        make_face()
    extrude(amount=BOSS_EXTRUDE14_DEPTH)

    # Sketch28 → Cut-Extrude11 (cut)
    with BuildSketch(Plane.XZ.offset(35.87)):
        with Locations((-52.879821914, 67.447674241)):
            Rectangle(SKETCH28_W, SKETCH28_H)
    extrude(amount=-CUT_EXTRUDE11_DEPTH, mode=Mode.SUBTRACT)

    # Sketch29 → Cut-Extrude12 (cut)
    with BuildSketch(Plane(origin=(0, 0, -20), x_dir=(-1, 0, 0), z_dir=(0, 0, -1))):
        with Locations((76.62, 2.575)):
            Rectangle(SKETCH29_W, SKETCH29_H)
    extrude(amount=-CUT_EXTRUDE12_DEPTH, mode=Mode.SUBTRACT)

    # Sketch30 → Boss-Extrude15 (add)
    with BuildSketch(Plane.ZY.offset(62.61)):
        Polygon((56.173042703, -5), (45, -5), (45, 0.15), (80, 0.15), (80, -5), (78.72230578, -5), align=None)
    extrude(amount=BOSS_EXTRUDE15_DEPTH)

    # Sketch31 → Boss-Extrude16 (add)
    with BuildSketch(Plane.XY.offset(79.713580848)):
        Polygon((-23.34563603, -35.87), (59.79, -5), (-23.34563603, -5), align=None)
    extrude(amount=-BOSS_EXTRUDE16_DEPTH)

    # Sketch32 → Cut-Extrude13 (cut)
    with BuildSketch(Plane(origin=(0, 5, 0), x_dir=(1, 0, 0), z_dir=(0, 1, 0))):
        with Locations((23.35, -25.500000004)):
            Rectangle(SKETCH32_W, SKETCH32_H)
    extrude(amount=-CUT_EXTRUDE13_DEPTH, mode=Mode.SUBTRACT)

    # Sketch33 → Cut-Extrude14 (cut)
    with BuildSketch(Plane.XZ.offset(53.59)):
        with Locations((-61.62, 17.385337084)):
            Rectangle(SKETCH33_W, SKETCH33_H)
    extrude(amount=-CUT_EXTRUDE14_DEPTH, mode=Mode.SUBTRACT)

    # Sketch34 → Cut-Extrude15 (cut)
    with BuildSketch(Plane.XZ.offset(53.59)):
        with Locations((-61.62, -14.153665729)):
            Rectangle(SKETCH34_W, SKETCH34_H)
    extrude(amount=-CUT_EXTRUDE15_DEPTH, mode=Mode.SUBTRACT)

    # Sketch35 → Cut-Extrude16 (cut)
    with BuildSketch(Plane(origin=(-23.34563603, 0, 0), x_dir=(0, 0, -1), z_dir=(1, 0, 0))):
        with Locations((-64.860027458, -15)):
            Rectangle(SKETCH35_W, SKETCH35_H)
    extrude(amount=-CUT_EXTRUDE16_DEPTH, mode=Mode.SUBTRACT)

    # Sketch36 → Cut-Extrude18 (cut)
    with BuildSketch(Plane(origin=(0, 5, 0), x_dir=(1, 0, 0), z_dir=(0, 1, 0))):
        with Locations((26.795, -58.695)):
            Rectangle(SKETCH36_W, SKETCH36_H)
    extrude(amount=-CUT_EXTRUDE18_DEPTH, mode=Mode.SUBTRACT)

    # Sketch38 → Cut-Extrude20 (cut)
    with BuildSketch(Plane(origin=(0, 5, 0), x_dir=(1, 0, 0), z_dir=(0, 1, 0))):
        with Locations((-73.433770599, -50.003237033)):
            Rectangle(SKETCH38_W, SKETCH38_H)
        Polygon((-50.215916204, -40), (-50.215916204, -55.006474067), (-23.34563603, -55.006474067), (-23.34563603, -74.713580848), (-10.521709133, -74.713580848), (-10.521709133, -40), align=None)
    extrude(amount=-CUT_EXTRUDE20_DEPTH, mode=Mode.SUBTRACT)

    # Sketch39 → Cut-Extrude21 (cut)
    with BuildSketch(Plane(origin=(0, 22.41, 0), x_dir=(1, 0, 0), z_dir=(0, 1, 0)).offset(CUT_EXTRUDE21_START)):
        with Locations(Location((-58.892597711, -54.885337085, 0), (0, 0, 90))):
            Circle(SKETCH39_R)
        with Locations(Location((55.658310639, -54.885337085, 0), (0, 0, 90))):
            Circle(SKETCH39_R_2)
    extrude(amount=CUT_EXTRUDE21_DEPTH, mode=Mode.SUBTRACT)


solid = part.part
